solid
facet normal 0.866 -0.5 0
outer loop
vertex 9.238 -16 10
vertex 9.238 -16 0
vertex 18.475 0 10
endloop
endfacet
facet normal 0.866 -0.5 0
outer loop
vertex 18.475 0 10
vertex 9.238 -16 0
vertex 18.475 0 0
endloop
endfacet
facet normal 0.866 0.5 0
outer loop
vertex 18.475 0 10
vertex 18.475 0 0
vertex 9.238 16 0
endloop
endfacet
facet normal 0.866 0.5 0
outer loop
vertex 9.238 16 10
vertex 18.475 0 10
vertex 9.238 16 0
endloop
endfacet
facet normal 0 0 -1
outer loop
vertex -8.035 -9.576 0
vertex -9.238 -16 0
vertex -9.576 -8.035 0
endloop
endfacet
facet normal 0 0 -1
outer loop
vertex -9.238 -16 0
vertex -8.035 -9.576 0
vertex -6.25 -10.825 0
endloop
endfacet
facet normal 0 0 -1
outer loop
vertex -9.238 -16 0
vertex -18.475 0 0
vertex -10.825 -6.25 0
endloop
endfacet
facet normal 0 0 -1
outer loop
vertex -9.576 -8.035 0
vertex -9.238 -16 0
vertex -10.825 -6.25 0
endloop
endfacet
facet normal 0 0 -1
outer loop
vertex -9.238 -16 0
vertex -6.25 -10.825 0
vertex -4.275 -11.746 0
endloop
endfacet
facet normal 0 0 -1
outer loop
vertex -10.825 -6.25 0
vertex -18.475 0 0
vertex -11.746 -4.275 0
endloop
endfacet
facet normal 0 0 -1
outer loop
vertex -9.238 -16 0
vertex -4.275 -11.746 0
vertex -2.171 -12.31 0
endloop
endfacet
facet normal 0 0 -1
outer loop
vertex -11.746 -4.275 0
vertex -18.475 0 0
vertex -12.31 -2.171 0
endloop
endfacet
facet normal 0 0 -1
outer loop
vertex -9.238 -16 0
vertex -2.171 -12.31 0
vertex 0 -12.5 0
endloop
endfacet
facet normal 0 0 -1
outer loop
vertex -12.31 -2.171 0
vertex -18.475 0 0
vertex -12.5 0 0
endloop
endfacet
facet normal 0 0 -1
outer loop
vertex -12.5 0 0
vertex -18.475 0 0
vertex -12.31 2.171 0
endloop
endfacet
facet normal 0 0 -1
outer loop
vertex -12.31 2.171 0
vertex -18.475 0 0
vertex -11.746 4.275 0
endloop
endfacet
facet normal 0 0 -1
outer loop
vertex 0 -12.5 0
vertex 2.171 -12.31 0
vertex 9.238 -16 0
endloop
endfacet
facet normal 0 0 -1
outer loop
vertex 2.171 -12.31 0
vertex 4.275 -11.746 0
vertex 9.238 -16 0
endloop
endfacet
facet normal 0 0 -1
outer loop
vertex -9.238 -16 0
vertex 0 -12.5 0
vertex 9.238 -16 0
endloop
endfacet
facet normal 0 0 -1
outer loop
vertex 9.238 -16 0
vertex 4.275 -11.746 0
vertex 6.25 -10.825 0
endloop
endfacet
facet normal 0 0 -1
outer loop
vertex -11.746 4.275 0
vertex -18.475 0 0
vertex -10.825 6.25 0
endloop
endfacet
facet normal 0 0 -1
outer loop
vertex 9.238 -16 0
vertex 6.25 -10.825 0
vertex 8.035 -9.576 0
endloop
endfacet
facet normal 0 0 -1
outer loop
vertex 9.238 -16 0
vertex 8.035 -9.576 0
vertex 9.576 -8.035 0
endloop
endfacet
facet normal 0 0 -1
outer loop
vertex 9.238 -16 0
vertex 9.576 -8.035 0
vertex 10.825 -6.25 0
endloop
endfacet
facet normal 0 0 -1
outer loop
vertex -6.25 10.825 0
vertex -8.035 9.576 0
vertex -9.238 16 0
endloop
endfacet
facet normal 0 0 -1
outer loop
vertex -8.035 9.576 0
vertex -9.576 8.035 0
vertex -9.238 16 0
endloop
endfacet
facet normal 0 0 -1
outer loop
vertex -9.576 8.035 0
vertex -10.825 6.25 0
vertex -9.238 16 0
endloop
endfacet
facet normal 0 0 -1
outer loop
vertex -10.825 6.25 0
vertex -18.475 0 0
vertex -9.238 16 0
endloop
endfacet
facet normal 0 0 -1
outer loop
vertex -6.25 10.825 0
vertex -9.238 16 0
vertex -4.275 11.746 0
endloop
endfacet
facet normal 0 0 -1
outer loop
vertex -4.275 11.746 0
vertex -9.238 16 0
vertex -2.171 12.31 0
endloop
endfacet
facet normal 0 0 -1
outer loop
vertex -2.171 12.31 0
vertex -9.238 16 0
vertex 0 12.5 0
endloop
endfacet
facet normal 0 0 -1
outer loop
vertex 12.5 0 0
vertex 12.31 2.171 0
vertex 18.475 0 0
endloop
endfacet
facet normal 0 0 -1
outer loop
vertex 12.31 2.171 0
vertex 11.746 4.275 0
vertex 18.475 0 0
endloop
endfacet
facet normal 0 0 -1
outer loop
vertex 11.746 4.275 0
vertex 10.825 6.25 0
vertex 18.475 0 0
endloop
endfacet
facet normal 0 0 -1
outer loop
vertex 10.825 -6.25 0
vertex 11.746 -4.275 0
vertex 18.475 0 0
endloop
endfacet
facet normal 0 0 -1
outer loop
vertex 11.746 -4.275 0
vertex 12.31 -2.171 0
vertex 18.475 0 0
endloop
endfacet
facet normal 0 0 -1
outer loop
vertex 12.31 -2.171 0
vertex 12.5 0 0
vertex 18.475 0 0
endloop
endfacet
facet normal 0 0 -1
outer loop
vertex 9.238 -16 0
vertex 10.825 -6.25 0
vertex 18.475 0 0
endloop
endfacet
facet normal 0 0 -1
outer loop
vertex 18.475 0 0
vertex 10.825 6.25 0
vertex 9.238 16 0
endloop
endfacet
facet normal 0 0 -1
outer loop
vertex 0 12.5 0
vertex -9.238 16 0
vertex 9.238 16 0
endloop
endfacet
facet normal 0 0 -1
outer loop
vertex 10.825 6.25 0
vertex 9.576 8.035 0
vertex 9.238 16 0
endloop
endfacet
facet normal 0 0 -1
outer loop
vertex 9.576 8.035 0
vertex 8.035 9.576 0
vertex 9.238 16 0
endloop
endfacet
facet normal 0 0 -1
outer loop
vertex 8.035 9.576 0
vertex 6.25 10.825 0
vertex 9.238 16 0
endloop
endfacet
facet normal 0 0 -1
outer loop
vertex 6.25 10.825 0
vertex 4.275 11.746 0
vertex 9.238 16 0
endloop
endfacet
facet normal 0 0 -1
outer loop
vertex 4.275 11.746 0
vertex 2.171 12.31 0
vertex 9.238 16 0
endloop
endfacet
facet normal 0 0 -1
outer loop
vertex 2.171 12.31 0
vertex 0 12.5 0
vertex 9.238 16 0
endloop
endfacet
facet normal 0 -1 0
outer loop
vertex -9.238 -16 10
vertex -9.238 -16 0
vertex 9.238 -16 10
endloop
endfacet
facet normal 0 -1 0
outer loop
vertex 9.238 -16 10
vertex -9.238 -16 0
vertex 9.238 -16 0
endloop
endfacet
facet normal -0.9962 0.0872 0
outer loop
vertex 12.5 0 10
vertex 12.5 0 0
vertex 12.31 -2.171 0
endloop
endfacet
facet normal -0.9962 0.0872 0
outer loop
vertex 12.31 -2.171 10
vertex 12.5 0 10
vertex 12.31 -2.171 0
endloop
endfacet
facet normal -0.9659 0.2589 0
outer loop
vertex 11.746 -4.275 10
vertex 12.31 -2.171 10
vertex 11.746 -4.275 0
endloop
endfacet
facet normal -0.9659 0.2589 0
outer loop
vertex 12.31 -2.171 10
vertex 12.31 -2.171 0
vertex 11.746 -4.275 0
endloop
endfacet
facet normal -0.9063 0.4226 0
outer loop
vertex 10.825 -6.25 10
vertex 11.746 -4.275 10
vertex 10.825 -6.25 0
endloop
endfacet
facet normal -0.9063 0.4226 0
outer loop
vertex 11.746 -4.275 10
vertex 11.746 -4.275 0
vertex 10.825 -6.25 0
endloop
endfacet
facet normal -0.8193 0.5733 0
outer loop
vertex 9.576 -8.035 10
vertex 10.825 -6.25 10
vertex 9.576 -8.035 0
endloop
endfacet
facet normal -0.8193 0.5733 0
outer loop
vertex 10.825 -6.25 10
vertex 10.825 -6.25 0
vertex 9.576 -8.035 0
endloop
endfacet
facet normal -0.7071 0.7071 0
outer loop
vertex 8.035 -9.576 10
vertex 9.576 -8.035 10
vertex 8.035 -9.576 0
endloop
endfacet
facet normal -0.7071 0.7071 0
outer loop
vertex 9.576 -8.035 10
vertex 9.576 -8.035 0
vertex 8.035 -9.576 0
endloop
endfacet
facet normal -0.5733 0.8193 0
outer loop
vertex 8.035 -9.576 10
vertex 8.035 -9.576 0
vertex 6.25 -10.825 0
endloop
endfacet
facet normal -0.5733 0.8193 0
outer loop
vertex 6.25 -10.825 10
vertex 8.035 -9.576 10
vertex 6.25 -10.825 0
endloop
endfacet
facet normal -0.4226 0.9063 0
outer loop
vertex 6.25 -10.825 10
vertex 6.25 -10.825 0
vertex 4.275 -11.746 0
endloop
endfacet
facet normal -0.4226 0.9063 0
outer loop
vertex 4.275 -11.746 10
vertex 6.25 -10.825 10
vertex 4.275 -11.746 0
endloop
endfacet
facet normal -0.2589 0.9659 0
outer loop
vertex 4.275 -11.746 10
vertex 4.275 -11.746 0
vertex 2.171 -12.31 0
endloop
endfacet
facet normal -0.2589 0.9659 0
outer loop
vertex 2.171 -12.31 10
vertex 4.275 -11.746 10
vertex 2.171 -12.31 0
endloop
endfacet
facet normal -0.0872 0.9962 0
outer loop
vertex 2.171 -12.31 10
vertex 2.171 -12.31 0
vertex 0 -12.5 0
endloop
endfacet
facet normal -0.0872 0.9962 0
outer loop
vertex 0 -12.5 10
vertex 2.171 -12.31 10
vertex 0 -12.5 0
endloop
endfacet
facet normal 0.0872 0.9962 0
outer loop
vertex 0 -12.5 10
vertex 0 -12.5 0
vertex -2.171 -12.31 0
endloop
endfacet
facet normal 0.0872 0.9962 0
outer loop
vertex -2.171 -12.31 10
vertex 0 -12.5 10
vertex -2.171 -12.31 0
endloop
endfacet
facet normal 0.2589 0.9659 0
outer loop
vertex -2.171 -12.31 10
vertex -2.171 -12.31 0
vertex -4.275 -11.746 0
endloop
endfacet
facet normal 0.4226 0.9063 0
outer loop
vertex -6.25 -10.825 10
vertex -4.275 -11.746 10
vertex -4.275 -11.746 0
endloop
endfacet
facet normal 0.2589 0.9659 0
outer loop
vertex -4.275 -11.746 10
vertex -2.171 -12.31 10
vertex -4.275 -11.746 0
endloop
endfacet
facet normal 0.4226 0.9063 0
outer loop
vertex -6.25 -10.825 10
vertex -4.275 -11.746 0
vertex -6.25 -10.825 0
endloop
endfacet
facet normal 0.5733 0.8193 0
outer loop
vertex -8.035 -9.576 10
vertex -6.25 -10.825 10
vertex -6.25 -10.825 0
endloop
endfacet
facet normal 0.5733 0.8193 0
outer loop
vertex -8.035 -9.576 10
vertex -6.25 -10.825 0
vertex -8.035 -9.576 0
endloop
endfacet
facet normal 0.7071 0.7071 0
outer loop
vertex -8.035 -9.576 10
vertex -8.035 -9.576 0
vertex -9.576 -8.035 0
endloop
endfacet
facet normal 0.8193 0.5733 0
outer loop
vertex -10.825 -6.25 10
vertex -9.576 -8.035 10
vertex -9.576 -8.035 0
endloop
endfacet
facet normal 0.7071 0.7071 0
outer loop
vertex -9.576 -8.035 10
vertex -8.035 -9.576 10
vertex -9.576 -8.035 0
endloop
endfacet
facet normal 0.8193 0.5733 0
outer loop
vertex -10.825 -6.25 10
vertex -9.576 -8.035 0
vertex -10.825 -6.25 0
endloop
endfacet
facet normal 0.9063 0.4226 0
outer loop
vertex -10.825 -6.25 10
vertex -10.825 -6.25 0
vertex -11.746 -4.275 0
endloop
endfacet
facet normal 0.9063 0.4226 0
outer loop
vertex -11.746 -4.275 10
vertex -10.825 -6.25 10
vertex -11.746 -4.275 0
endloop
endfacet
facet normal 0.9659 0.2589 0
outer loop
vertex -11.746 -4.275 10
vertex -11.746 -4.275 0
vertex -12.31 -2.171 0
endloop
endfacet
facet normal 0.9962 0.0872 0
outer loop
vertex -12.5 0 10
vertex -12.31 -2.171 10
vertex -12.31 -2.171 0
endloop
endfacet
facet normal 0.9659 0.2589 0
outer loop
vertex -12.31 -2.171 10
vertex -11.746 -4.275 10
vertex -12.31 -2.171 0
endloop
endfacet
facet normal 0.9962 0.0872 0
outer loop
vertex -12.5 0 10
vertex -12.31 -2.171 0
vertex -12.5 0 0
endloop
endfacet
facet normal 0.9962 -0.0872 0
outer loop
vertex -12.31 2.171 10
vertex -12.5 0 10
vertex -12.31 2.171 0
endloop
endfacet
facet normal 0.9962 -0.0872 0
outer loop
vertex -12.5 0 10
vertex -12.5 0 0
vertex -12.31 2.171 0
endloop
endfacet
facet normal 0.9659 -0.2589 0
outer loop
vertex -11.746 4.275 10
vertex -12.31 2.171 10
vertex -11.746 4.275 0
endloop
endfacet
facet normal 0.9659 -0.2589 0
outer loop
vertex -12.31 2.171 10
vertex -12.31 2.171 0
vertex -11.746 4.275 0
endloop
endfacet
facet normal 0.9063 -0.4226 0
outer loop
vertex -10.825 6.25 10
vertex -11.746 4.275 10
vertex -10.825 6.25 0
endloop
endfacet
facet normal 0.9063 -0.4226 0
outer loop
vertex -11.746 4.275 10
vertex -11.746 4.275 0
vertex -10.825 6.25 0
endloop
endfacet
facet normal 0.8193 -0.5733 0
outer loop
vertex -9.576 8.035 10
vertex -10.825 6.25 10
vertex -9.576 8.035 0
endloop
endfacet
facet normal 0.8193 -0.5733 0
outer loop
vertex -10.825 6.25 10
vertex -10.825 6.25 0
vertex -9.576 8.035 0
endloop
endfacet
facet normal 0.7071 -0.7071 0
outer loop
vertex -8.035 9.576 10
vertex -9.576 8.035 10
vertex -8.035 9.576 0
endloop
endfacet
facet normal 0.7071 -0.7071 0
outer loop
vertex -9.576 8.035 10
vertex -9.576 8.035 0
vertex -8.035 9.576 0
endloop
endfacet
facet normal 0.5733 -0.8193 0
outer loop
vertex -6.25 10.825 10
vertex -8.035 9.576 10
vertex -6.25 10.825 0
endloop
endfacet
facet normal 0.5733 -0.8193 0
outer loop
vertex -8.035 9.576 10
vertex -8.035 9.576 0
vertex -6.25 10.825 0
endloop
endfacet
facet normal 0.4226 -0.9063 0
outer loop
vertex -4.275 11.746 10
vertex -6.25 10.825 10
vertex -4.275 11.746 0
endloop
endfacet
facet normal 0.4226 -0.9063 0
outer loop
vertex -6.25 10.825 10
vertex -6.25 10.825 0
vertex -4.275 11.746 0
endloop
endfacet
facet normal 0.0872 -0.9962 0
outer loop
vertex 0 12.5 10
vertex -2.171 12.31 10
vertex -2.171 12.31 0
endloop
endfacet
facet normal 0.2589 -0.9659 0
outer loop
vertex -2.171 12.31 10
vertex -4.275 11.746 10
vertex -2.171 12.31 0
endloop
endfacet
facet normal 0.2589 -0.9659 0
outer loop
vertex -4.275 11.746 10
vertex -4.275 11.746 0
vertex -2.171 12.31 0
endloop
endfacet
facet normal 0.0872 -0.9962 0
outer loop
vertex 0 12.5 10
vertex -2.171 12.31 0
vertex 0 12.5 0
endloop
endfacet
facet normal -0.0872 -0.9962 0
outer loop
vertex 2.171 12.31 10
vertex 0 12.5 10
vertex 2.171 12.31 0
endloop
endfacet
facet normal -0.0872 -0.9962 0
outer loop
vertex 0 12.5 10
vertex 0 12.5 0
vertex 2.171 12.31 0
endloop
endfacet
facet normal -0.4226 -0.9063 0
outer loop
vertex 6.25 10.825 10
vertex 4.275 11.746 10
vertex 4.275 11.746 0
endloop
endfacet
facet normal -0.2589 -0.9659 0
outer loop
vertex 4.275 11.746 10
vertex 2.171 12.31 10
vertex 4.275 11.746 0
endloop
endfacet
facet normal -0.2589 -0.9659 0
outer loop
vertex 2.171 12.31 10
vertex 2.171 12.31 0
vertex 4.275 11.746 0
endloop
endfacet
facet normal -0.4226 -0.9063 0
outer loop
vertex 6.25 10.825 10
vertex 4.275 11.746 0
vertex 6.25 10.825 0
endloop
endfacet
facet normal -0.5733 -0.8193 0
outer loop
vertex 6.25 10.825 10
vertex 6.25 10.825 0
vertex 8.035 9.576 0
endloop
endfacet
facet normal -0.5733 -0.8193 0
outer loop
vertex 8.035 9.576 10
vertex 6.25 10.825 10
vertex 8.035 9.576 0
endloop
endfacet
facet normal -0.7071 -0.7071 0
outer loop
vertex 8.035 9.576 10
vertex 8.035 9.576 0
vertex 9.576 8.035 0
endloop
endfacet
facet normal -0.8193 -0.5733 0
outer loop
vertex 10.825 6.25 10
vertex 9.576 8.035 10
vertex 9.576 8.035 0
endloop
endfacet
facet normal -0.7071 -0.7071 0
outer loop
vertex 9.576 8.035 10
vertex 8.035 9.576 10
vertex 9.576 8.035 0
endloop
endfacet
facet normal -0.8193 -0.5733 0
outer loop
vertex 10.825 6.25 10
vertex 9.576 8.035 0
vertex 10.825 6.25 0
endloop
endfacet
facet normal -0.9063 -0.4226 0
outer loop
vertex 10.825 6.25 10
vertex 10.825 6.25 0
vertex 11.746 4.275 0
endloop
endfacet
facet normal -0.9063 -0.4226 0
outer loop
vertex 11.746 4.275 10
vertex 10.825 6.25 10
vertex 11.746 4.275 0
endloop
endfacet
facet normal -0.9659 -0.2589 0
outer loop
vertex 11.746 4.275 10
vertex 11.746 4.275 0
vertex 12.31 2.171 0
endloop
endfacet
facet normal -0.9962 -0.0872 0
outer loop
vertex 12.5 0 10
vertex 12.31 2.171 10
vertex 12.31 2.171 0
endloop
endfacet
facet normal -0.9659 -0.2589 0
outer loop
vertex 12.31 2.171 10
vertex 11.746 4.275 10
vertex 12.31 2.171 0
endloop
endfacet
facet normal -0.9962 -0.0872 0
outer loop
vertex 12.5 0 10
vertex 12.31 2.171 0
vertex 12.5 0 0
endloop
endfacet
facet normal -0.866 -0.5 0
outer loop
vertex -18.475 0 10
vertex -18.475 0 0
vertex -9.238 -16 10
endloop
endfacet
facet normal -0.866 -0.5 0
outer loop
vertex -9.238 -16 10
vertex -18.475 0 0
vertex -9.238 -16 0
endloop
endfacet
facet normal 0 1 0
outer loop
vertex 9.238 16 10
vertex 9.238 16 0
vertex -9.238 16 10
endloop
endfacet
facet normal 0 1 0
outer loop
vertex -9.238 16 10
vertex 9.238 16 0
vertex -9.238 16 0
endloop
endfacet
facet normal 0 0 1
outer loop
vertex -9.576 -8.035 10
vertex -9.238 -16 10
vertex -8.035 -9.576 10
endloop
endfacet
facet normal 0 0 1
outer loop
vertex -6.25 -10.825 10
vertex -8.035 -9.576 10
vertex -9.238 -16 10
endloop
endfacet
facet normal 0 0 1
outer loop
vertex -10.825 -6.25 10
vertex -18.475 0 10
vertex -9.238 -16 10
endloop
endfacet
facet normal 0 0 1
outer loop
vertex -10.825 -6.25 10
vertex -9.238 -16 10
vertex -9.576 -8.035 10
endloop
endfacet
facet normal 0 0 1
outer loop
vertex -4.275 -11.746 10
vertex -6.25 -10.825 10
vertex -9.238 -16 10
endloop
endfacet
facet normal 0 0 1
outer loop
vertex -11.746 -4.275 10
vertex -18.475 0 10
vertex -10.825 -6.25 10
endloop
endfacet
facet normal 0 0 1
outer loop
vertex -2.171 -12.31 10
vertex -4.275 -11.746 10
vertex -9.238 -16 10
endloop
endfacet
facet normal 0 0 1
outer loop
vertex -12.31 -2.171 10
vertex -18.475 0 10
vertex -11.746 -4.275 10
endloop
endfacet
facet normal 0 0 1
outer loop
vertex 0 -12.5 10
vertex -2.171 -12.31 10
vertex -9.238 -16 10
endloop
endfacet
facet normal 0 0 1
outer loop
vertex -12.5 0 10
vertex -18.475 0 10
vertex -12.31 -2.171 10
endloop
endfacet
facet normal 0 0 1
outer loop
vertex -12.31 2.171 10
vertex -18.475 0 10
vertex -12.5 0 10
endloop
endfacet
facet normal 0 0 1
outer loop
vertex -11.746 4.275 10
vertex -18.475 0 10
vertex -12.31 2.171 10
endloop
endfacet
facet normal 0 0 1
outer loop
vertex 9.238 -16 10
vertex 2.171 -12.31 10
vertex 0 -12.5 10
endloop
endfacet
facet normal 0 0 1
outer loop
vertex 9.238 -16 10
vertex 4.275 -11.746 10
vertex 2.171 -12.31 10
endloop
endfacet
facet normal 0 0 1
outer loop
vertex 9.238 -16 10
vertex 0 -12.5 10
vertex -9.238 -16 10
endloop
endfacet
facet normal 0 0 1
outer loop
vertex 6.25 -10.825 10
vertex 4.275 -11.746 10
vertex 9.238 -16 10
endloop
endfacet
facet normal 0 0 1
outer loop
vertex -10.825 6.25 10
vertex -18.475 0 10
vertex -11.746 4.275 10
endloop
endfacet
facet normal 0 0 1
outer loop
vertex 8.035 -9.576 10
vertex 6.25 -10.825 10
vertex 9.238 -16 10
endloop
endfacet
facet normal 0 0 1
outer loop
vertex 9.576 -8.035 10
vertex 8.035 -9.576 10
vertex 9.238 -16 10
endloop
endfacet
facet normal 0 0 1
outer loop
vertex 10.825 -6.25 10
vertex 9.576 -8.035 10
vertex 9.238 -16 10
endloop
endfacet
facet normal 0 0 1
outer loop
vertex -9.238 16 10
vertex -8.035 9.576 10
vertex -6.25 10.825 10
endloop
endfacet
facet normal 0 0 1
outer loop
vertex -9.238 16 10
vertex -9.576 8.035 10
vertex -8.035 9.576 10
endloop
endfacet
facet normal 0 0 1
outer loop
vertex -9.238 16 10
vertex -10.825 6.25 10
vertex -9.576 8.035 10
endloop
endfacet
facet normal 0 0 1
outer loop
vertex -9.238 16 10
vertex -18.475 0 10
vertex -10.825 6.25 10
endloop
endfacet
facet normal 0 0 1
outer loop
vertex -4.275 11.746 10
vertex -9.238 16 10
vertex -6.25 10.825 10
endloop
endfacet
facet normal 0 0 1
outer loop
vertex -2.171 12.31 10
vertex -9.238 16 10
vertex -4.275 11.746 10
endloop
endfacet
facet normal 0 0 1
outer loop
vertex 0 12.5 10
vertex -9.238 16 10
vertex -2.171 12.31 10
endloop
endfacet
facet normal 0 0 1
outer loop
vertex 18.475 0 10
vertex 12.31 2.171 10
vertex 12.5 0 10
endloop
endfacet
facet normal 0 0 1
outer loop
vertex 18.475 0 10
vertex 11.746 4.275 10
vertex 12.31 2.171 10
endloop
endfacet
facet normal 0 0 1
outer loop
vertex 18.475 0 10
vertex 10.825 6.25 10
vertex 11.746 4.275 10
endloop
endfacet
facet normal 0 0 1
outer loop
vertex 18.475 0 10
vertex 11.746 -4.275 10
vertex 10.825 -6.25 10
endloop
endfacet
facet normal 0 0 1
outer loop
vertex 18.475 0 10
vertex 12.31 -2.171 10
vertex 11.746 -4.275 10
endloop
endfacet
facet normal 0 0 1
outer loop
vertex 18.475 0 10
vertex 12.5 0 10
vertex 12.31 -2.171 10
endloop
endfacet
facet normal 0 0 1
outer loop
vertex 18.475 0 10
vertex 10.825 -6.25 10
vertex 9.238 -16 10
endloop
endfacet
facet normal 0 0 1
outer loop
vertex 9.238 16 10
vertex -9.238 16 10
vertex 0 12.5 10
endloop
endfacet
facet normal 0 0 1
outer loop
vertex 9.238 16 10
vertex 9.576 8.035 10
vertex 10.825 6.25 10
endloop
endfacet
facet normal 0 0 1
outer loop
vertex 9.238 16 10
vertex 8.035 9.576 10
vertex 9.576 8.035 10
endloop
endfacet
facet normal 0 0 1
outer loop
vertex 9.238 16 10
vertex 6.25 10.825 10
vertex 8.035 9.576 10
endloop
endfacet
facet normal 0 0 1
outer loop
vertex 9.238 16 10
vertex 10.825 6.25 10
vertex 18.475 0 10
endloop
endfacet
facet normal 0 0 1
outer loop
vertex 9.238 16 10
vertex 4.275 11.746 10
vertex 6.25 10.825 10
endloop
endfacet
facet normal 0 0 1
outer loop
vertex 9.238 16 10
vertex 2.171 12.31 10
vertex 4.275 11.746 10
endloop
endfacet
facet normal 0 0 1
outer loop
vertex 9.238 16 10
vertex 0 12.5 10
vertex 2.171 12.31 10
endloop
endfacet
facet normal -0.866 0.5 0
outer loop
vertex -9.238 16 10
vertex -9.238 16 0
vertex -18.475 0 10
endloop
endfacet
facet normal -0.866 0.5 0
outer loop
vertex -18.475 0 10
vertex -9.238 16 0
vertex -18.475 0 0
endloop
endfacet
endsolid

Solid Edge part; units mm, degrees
sketch "Sketch1" plane through (0, 0, 0) normal (0, 0, 1) x (1, 0, 0)
  circle A0 centre (0, 0) radius 12.5
  line L0 (-9.2376, 16) -> (-18.4752, 0)
  line L1 (-18.4752, 0) -> (-9.2376, -16)
  line L2 (-9.2376, -16) -> (9.2376, -16)
  line L3 (9.2376, -16) -> (18.4752, 0)
  line L4 (18.4752, 0) -> (9.2376, 16)
  line L5 (9.2376, 16) -> (-9.2376, 16)
extrude "Protrusion1" add sketch "Sketch1" along normal blind 10
